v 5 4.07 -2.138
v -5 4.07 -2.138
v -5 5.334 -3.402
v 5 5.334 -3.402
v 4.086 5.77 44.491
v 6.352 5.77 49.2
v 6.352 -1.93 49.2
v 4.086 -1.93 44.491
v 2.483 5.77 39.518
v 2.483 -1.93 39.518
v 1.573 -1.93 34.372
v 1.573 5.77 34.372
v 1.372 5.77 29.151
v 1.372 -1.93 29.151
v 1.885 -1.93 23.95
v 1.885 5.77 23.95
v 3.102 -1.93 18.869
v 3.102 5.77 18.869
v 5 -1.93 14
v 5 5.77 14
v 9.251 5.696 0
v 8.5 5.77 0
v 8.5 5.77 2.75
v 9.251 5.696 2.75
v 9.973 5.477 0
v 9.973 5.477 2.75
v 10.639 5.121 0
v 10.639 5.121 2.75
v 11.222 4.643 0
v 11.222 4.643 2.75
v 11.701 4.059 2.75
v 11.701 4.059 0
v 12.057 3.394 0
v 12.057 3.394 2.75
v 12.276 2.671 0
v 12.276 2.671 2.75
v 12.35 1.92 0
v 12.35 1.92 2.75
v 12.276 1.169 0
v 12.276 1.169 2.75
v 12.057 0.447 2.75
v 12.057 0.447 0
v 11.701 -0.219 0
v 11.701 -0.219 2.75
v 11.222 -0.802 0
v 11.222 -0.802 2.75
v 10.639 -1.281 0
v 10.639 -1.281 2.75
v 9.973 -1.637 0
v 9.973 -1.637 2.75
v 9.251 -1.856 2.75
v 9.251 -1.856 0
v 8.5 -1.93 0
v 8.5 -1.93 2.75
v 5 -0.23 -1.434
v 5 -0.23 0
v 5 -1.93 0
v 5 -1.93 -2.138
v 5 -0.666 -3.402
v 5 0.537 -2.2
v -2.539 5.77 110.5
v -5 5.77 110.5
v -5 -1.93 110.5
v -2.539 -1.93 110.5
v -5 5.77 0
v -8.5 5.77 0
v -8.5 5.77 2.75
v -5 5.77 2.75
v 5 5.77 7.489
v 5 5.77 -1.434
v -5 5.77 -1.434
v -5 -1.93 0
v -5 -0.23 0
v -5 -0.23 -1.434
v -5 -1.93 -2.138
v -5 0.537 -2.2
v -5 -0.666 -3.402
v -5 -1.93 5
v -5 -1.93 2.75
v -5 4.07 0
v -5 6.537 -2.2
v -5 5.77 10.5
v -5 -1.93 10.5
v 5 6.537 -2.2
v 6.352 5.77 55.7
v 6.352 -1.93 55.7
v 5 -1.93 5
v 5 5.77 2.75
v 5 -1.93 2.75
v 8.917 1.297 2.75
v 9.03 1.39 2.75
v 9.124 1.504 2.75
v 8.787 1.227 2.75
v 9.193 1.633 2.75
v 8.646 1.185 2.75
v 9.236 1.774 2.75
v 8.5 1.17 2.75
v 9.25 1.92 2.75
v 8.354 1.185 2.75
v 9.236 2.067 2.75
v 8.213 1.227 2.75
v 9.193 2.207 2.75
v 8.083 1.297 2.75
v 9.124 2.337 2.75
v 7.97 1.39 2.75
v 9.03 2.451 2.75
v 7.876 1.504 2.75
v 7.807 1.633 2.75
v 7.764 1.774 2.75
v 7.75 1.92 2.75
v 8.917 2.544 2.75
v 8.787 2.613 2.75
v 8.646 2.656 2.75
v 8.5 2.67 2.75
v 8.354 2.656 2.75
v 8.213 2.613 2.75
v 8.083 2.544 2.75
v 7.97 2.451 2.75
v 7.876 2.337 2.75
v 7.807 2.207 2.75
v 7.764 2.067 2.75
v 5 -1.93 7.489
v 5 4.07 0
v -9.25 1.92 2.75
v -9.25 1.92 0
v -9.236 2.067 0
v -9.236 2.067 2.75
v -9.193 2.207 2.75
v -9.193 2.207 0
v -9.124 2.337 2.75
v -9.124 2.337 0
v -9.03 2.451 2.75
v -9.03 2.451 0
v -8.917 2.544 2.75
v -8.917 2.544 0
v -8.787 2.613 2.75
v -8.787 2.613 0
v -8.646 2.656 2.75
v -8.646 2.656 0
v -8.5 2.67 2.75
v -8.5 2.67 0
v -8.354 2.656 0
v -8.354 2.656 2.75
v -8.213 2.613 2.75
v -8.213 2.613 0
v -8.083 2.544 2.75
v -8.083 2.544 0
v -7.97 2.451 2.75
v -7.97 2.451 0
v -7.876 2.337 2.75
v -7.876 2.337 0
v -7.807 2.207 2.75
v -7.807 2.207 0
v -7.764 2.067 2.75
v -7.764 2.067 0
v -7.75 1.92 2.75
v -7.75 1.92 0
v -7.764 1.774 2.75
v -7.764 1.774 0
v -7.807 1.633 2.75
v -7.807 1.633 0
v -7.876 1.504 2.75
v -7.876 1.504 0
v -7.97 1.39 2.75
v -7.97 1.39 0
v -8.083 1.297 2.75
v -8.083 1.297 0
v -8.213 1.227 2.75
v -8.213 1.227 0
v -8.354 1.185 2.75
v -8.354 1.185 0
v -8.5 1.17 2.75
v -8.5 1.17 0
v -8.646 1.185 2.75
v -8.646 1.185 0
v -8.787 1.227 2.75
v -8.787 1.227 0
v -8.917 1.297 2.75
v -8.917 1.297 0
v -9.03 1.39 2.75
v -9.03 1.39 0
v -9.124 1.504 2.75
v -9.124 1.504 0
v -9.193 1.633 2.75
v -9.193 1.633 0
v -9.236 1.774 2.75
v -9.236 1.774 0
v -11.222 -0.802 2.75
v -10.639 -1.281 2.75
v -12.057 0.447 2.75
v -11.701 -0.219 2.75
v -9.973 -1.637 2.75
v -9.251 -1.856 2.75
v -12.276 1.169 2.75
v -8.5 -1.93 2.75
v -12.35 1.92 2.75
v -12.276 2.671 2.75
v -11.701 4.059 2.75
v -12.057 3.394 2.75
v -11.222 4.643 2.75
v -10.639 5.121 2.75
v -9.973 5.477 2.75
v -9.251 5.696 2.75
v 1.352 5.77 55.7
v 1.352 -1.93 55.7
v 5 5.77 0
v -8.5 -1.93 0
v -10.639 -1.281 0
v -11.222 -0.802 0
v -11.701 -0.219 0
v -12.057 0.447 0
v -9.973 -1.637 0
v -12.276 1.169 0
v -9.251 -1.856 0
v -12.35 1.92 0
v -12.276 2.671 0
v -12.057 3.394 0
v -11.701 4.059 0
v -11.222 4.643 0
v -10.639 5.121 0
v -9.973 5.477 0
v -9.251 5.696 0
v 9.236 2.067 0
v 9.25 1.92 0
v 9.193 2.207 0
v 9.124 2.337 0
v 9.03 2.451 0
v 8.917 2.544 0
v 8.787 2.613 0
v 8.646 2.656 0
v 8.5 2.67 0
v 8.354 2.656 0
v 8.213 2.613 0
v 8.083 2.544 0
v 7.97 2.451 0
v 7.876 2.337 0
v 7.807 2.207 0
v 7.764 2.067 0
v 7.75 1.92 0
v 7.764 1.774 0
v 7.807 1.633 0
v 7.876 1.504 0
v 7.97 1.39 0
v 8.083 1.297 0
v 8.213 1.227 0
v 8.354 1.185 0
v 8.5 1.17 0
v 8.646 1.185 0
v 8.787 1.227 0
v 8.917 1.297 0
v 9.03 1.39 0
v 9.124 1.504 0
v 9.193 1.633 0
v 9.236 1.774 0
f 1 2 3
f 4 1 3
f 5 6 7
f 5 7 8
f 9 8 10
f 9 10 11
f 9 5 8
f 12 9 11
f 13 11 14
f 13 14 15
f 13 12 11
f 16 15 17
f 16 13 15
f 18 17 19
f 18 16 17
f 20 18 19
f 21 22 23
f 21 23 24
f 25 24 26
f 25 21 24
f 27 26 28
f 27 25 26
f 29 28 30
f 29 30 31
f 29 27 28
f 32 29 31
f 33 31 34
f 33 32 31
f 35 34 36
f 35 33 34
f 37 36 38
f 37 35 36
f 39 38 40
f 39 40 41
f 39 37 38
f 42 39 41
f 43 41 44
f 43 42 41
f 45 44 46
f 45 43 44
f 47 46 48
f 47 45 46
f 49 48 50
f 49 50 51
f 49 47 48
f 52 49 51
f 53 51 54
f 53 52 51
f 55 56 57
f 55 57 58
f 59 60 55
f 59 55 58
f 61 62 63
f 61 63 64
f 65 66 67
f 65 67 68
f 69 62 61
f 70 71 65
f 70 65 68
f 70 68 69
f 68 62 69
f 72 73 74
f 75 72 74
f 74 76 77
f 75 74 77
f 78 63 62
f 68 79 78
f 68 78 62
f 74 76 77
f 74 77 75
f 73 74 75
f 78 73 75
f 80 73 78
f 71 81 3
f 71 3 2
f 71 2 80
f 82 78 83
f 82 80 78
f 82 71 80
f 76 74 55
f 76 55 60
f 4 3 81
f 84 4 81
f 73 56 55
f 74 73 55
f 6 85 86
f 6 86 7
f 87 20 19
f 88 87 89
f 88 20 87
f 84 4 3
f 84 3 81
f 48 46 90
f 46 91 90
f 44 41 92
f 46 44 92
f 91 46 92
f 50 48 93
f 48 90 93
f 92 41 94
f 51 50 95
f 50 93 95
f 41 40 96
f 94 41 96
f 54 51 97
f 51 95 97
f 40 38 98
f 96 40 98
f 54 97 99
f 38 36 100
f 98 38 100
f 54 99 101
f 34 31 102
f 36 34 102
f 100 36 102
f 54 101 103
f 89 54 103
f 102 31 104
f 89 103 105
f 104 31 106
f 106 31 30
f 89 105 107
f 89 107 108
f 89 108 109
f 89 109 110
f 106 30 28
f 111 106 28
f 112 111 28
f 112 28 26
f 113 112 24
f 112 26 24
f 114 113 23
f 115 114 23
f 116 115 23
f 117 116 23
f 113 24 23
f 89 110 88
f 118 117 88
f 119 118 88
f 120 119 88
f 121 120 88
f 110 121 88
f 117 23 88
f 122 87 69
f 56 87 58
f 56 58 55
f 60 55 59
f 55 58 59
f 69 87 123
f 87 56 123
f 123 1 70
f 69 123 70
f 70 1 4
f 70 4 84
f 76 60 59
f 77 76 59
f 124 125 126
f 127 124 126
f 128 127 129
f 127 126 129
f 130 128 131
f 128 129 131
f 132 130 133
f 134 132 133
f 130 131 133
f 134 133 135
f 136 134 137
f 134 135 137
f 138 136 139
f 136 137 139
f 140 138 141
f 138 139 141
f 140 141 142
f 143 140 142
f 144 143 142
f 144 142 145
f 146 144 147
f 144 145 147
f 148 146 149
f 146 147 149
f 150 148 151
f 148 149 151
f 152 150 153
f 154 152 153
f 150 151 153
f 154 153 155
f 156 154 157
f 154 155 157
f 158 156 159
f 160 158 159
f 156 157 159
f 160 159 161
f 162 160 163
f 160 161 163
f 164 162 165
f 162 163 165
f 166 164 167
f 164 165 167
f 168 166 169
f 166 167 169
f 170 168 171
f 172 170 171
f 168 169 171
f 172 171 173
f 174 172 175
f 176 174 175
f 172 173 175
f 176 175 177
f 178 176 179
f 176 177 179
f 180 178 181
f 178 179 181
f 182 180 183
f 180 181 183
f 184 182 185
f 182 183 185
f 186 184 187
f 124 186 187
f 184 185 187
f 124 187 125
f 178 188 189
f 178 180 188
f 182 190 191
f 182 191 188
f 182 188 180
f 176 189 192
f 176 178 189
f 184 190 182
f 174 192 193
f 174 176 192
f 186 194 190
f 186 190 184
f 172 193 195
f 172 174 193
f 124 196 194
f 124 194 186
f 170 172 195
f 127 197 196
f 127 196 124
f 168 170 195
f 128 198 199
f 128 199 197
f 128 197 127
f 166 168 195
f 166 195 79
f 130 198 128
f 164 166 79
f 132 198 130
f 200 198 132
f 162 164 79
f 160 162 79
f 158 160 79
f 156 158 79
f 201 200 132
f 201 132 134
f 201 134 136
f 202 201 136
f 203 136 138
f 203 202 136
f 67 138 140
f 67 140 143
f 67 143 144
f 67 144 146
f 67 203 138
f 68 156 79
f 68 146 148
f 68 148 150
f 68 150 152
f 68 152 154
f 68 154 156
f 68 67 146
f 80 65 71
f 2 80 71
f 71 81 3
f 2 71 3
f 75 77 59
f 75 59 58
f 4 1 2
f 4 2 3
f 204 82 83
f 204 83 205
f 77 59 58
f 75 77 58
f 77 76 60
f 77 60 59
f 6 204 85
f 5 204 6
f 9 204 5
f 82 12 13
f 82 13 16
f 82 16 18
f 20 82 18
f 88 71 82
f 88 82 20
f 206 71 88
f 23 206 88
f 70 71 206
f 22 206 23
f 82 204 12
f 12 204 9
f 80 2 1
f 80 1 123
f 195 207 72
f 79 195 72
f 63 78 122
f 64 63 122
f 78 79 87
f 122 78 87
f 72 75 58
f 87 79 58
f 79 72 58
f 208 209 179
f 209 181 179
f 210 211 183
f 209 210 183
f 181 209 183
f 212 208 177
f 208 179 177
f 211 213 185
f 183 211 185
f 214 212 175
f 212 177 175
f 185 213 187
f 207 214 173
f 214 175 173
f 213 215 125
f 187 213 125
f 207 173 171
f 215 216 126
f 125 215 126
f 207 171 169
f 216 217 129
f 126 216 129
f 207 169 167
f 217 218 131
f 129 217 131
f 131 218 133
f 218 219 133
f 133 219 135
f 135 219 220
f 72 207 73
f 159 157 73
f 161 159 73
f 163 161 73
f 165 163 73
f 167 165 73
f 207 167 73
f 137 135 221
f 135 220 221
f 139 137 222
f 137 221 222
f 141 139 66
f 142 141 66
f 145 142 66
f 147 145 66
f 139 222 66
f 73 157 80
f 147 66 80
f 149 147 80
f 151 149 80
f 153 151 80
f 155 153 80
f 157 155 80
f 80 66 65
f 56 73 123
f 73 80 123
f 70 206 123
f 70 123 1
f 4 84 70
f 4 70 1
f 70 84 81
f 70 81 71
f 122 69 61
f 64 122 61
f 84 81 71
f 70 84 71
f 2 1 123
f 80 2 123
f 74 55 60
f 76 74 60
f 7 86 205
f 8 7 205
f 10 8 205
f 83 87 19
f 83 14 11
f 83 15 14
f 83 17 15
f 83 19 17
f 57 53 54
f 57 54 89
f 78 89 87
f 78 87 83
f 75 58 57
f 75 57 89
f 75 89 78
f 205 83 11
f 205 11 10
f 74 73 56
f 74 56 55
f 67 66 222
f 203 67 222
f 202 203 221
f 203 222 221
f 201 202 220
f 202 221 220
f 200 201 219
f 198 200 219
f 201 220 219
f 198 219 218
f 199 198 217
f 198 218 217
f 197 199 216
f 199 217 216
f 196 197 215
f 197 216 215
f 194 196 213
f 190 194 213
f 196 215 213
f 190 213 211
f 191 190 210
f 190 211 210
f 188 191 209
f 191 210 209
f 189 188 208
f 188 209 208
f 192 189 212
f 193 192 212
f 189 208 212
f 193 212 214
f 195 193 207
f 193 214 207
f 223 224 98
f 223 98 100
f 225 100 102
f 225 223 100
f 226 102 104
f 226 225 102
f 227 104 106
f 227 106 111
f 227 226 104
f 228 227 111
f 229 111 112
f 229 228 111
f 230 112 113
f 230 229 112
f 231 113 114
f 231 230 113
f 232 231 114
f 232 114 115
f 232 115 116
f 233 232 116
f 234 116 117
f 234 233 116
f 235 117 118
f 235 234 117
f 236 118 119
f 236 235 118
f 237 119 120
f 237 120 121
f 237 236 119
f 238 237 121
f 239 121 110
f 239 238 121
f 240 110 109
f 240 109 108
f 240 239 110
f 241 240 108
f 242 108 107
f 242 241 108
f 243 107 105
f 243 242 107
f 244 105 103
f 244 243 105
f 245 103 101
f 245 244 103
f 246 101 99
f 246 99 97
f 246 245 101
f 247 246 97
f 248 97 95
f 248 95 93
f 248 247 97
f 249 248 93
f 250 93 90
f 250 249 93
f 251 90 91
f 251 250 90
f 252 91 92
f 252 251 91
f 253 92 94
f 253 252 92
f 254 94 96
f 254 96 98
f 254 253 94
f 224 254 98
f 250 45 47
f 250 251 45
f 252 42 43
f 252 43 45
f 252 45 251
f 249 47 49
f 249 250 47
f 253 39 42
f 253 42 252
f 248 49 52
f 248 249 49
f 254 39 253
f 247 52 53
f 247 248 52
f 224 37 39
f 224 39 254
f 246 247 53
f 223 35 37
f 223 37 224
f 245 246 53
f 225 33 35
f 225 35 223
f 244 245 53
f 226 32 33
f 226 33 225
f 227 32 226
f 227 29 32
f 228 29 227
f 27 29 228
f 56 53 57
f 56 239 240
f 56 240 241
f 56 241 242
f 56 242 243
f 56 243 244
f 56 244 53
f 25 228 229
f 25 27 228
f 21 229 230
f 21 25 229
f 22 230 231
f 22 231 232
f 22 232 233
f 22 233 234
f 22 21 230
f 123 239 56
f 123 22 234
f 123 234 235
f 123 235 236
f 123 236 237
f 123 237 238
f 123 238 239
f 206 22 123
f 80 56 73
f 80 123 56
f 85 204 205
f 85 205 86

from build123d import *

# Parameters (mm, degrees)
SKETCH2_W           = 10
SKETCH2_H           = 14.768412439
BOSS_EXTRUDE1_DEPTH = 5
BOSS_EXTRUDE4_DEPTH = 10
SKETCH9_W           = 10
SKETCH9_H           = 3.18
SKETCH9_H_2         = 3.888412439
CUT_EXTRUDE3_DEPTH  = 5
BOSS_EXTRUDE5_DEPTH = 7.7
SKETCH12_R          = 0.75
BOSS_EXTRUDE7_DEPTH = 2.75
FILLET1_R           = 2.5
SKETCH13_W          = 13.67386451
SKETCH13_H          = 47.62797089
CUT_EXTRUDE4_DEPTH  = 100
SKETCH14_W          = 10
SKETCH14_H          = 7.7
BOSS_EXTRUDE8_DEPTH = 100
CUT_EXTRUDE5_DEPTH  = 100


with BuildPart() as part:
    # Sketch2 → Boss-Extrude1 (new body)
    with BuildSketch(Plane.XY):
        with Locations((0, 1.566049366)):
            Rectangle(SKETCH2_W, SKETCH2_H)
    extrude(amount=BOSS_EXTRUDE1_DEPTH)

    # Sketch8 → Boss-Extrude4 (add)
    with BuildSketch(Plane.ZY.offset(5)):
        Polygon((-0.15, 5.770255585), (0, 5.770255585), (0, 4.070255585), (-0.15, 4.070255585), (-2.137867966, 4.070255585), (-3.402081528, 5.334469147), (-2.2, 6.536550675), (-1.43370491, 5.770255585), align=None)
        Polygon((-0.15, -1.929744415), (0, -1.929744415), (0, -0.229744415), (-0.15, -0.229744415), (-1.43370491, -0.229744415), (-2.2, 0.536550675), (-3.402081528, -0.665530853), (-2.137867966, -1.929744415), align=None)
    extrude(amount=-BOSS_EXTRUDE4_DEPTH)

    # Sketch9 → Cut-Extrude3 (cut)
    with BuildSketch(Plane(origin=(0, 0, 0), x_dir=(-1, 0, 0), z_dir=(0, 0, -1))):
        with Locations((0, 7.360255585)):
            Rectangle(SKETCH9_W, SKETCH9_H)
        with Locations((0, -3.873950635)):
            Rectangle(SKETCH9_W, SKETCH9_H_2)
    extrude(amount=-CUT_EXTRUDE3_DEPTH, mode=Mode.SUBTRACT)

    # Sketch10 → Boss-Extrude5 (add)
    with BuildSketch(Plane(origin=(0, 5.770255585, 0), x_dir=(1, 0, 0), z_dir=(0, 1, 0))):
        with BuildLine():
            Line((-5, -5), (-5, -10.5))
            Line((-5, -10.5), (1.352445729, -55.7))
            Line((1.352445729, -55.7), (6.352445729, -55.7))
            Line((6.352445729, -55.7), (6.352445729, -49.2))
            ThreePointArc((6.352445729, -49.2), (1.383429579, -31.764936646), (5, -14))
            Line((5, -14), (5, -5))
            Line((5, -5), (-5, -5))
        make_face()
    extrude(amount=-BOSS_EXTRUDE5_DEPTH)

    # Sketch12 → Boss-Extrude7 (add)
    with BuildSketch(Plane.XY):
        with BuildLine():
            Line((5, 5.770255585), (8.5, 5.770255585))
            ThreePointArc((8.5, 5.770255585), (12.35, 1.920255585), (8.5, -1.929744415))
            Line((8.5, -1.929744415), (5, -1.929744415))
            Line((5, -1.929744415), (5, 5.770255585))
        make_face()
        with Locations((8.5, 1.920255585)):
            Circle(SKETCH12_R, mode=Mode.SUBTRACT)
    extrude(amount=BOSS_EXTRUDE7_DEPTH)


with BuildPart() as body_2:
    # Mirror1: mirrored copy
    add(part.part.mirror(Plane(origin=(0, 0, 0), x_dir=(0, 0, 1), z_dir=(1, 0, 0))))

    # Fillet1
    fillet1_edges = [body_2.edges().sort_by_distance(p)[0] for p in [
        (-6.352445729, 1.920255585, 49.2),
        (-5, 1.920255585, 14),
        (-1.352445729, 1.920255585, 55.7),
        (-6.352445729, 1.920255585, 55.7),
    ]]
    fillet(fillet1_edges, radius=FILLET1_R)

    # Sketch13 → Cut-Extrude4 (cut)
    with BuildSketch(Plane(origin=(0, 5.770255585, 0), x_dir=(1, 0, 0), z_dir=(0, 1, 0))):
        with Locations((-1.836932255, -34.313985445)):
            Rectangle(SKETCH13_W, SKETCH13_H)
    extrude(amount=-CUT_EXTRUDE4_DEPTH, mode=Mode.SUBTRACT)

    # Sketch14 → Boss-Extrude8 (add)
    with BuildSketch(Plane.XY.offset(10.5)):
        with Locations((0, 1.920255585)):
            Rectangle(SKETCH14_W, SKETCH14_H)
    extrude(amount=BOSS_EXTRUDE8_DEPTH)

    # Sketch15 → Cut-Extrude5 (cut)
    with BuildSketch(Plane(origin=(0, 5.770255585, 0), x_dir=(1, 0, 0), z_dir=(0, 1, 0))):
        Polygon((5, -7.489382654), (-2.538683526, -110.5), (5, -110.5), align=None)
    extrude(amount=-CUT_EXTRUDE5_DEPTH, mode=Mode.SUBTRACT)


solid = Compound([part.part, body_2.part])
